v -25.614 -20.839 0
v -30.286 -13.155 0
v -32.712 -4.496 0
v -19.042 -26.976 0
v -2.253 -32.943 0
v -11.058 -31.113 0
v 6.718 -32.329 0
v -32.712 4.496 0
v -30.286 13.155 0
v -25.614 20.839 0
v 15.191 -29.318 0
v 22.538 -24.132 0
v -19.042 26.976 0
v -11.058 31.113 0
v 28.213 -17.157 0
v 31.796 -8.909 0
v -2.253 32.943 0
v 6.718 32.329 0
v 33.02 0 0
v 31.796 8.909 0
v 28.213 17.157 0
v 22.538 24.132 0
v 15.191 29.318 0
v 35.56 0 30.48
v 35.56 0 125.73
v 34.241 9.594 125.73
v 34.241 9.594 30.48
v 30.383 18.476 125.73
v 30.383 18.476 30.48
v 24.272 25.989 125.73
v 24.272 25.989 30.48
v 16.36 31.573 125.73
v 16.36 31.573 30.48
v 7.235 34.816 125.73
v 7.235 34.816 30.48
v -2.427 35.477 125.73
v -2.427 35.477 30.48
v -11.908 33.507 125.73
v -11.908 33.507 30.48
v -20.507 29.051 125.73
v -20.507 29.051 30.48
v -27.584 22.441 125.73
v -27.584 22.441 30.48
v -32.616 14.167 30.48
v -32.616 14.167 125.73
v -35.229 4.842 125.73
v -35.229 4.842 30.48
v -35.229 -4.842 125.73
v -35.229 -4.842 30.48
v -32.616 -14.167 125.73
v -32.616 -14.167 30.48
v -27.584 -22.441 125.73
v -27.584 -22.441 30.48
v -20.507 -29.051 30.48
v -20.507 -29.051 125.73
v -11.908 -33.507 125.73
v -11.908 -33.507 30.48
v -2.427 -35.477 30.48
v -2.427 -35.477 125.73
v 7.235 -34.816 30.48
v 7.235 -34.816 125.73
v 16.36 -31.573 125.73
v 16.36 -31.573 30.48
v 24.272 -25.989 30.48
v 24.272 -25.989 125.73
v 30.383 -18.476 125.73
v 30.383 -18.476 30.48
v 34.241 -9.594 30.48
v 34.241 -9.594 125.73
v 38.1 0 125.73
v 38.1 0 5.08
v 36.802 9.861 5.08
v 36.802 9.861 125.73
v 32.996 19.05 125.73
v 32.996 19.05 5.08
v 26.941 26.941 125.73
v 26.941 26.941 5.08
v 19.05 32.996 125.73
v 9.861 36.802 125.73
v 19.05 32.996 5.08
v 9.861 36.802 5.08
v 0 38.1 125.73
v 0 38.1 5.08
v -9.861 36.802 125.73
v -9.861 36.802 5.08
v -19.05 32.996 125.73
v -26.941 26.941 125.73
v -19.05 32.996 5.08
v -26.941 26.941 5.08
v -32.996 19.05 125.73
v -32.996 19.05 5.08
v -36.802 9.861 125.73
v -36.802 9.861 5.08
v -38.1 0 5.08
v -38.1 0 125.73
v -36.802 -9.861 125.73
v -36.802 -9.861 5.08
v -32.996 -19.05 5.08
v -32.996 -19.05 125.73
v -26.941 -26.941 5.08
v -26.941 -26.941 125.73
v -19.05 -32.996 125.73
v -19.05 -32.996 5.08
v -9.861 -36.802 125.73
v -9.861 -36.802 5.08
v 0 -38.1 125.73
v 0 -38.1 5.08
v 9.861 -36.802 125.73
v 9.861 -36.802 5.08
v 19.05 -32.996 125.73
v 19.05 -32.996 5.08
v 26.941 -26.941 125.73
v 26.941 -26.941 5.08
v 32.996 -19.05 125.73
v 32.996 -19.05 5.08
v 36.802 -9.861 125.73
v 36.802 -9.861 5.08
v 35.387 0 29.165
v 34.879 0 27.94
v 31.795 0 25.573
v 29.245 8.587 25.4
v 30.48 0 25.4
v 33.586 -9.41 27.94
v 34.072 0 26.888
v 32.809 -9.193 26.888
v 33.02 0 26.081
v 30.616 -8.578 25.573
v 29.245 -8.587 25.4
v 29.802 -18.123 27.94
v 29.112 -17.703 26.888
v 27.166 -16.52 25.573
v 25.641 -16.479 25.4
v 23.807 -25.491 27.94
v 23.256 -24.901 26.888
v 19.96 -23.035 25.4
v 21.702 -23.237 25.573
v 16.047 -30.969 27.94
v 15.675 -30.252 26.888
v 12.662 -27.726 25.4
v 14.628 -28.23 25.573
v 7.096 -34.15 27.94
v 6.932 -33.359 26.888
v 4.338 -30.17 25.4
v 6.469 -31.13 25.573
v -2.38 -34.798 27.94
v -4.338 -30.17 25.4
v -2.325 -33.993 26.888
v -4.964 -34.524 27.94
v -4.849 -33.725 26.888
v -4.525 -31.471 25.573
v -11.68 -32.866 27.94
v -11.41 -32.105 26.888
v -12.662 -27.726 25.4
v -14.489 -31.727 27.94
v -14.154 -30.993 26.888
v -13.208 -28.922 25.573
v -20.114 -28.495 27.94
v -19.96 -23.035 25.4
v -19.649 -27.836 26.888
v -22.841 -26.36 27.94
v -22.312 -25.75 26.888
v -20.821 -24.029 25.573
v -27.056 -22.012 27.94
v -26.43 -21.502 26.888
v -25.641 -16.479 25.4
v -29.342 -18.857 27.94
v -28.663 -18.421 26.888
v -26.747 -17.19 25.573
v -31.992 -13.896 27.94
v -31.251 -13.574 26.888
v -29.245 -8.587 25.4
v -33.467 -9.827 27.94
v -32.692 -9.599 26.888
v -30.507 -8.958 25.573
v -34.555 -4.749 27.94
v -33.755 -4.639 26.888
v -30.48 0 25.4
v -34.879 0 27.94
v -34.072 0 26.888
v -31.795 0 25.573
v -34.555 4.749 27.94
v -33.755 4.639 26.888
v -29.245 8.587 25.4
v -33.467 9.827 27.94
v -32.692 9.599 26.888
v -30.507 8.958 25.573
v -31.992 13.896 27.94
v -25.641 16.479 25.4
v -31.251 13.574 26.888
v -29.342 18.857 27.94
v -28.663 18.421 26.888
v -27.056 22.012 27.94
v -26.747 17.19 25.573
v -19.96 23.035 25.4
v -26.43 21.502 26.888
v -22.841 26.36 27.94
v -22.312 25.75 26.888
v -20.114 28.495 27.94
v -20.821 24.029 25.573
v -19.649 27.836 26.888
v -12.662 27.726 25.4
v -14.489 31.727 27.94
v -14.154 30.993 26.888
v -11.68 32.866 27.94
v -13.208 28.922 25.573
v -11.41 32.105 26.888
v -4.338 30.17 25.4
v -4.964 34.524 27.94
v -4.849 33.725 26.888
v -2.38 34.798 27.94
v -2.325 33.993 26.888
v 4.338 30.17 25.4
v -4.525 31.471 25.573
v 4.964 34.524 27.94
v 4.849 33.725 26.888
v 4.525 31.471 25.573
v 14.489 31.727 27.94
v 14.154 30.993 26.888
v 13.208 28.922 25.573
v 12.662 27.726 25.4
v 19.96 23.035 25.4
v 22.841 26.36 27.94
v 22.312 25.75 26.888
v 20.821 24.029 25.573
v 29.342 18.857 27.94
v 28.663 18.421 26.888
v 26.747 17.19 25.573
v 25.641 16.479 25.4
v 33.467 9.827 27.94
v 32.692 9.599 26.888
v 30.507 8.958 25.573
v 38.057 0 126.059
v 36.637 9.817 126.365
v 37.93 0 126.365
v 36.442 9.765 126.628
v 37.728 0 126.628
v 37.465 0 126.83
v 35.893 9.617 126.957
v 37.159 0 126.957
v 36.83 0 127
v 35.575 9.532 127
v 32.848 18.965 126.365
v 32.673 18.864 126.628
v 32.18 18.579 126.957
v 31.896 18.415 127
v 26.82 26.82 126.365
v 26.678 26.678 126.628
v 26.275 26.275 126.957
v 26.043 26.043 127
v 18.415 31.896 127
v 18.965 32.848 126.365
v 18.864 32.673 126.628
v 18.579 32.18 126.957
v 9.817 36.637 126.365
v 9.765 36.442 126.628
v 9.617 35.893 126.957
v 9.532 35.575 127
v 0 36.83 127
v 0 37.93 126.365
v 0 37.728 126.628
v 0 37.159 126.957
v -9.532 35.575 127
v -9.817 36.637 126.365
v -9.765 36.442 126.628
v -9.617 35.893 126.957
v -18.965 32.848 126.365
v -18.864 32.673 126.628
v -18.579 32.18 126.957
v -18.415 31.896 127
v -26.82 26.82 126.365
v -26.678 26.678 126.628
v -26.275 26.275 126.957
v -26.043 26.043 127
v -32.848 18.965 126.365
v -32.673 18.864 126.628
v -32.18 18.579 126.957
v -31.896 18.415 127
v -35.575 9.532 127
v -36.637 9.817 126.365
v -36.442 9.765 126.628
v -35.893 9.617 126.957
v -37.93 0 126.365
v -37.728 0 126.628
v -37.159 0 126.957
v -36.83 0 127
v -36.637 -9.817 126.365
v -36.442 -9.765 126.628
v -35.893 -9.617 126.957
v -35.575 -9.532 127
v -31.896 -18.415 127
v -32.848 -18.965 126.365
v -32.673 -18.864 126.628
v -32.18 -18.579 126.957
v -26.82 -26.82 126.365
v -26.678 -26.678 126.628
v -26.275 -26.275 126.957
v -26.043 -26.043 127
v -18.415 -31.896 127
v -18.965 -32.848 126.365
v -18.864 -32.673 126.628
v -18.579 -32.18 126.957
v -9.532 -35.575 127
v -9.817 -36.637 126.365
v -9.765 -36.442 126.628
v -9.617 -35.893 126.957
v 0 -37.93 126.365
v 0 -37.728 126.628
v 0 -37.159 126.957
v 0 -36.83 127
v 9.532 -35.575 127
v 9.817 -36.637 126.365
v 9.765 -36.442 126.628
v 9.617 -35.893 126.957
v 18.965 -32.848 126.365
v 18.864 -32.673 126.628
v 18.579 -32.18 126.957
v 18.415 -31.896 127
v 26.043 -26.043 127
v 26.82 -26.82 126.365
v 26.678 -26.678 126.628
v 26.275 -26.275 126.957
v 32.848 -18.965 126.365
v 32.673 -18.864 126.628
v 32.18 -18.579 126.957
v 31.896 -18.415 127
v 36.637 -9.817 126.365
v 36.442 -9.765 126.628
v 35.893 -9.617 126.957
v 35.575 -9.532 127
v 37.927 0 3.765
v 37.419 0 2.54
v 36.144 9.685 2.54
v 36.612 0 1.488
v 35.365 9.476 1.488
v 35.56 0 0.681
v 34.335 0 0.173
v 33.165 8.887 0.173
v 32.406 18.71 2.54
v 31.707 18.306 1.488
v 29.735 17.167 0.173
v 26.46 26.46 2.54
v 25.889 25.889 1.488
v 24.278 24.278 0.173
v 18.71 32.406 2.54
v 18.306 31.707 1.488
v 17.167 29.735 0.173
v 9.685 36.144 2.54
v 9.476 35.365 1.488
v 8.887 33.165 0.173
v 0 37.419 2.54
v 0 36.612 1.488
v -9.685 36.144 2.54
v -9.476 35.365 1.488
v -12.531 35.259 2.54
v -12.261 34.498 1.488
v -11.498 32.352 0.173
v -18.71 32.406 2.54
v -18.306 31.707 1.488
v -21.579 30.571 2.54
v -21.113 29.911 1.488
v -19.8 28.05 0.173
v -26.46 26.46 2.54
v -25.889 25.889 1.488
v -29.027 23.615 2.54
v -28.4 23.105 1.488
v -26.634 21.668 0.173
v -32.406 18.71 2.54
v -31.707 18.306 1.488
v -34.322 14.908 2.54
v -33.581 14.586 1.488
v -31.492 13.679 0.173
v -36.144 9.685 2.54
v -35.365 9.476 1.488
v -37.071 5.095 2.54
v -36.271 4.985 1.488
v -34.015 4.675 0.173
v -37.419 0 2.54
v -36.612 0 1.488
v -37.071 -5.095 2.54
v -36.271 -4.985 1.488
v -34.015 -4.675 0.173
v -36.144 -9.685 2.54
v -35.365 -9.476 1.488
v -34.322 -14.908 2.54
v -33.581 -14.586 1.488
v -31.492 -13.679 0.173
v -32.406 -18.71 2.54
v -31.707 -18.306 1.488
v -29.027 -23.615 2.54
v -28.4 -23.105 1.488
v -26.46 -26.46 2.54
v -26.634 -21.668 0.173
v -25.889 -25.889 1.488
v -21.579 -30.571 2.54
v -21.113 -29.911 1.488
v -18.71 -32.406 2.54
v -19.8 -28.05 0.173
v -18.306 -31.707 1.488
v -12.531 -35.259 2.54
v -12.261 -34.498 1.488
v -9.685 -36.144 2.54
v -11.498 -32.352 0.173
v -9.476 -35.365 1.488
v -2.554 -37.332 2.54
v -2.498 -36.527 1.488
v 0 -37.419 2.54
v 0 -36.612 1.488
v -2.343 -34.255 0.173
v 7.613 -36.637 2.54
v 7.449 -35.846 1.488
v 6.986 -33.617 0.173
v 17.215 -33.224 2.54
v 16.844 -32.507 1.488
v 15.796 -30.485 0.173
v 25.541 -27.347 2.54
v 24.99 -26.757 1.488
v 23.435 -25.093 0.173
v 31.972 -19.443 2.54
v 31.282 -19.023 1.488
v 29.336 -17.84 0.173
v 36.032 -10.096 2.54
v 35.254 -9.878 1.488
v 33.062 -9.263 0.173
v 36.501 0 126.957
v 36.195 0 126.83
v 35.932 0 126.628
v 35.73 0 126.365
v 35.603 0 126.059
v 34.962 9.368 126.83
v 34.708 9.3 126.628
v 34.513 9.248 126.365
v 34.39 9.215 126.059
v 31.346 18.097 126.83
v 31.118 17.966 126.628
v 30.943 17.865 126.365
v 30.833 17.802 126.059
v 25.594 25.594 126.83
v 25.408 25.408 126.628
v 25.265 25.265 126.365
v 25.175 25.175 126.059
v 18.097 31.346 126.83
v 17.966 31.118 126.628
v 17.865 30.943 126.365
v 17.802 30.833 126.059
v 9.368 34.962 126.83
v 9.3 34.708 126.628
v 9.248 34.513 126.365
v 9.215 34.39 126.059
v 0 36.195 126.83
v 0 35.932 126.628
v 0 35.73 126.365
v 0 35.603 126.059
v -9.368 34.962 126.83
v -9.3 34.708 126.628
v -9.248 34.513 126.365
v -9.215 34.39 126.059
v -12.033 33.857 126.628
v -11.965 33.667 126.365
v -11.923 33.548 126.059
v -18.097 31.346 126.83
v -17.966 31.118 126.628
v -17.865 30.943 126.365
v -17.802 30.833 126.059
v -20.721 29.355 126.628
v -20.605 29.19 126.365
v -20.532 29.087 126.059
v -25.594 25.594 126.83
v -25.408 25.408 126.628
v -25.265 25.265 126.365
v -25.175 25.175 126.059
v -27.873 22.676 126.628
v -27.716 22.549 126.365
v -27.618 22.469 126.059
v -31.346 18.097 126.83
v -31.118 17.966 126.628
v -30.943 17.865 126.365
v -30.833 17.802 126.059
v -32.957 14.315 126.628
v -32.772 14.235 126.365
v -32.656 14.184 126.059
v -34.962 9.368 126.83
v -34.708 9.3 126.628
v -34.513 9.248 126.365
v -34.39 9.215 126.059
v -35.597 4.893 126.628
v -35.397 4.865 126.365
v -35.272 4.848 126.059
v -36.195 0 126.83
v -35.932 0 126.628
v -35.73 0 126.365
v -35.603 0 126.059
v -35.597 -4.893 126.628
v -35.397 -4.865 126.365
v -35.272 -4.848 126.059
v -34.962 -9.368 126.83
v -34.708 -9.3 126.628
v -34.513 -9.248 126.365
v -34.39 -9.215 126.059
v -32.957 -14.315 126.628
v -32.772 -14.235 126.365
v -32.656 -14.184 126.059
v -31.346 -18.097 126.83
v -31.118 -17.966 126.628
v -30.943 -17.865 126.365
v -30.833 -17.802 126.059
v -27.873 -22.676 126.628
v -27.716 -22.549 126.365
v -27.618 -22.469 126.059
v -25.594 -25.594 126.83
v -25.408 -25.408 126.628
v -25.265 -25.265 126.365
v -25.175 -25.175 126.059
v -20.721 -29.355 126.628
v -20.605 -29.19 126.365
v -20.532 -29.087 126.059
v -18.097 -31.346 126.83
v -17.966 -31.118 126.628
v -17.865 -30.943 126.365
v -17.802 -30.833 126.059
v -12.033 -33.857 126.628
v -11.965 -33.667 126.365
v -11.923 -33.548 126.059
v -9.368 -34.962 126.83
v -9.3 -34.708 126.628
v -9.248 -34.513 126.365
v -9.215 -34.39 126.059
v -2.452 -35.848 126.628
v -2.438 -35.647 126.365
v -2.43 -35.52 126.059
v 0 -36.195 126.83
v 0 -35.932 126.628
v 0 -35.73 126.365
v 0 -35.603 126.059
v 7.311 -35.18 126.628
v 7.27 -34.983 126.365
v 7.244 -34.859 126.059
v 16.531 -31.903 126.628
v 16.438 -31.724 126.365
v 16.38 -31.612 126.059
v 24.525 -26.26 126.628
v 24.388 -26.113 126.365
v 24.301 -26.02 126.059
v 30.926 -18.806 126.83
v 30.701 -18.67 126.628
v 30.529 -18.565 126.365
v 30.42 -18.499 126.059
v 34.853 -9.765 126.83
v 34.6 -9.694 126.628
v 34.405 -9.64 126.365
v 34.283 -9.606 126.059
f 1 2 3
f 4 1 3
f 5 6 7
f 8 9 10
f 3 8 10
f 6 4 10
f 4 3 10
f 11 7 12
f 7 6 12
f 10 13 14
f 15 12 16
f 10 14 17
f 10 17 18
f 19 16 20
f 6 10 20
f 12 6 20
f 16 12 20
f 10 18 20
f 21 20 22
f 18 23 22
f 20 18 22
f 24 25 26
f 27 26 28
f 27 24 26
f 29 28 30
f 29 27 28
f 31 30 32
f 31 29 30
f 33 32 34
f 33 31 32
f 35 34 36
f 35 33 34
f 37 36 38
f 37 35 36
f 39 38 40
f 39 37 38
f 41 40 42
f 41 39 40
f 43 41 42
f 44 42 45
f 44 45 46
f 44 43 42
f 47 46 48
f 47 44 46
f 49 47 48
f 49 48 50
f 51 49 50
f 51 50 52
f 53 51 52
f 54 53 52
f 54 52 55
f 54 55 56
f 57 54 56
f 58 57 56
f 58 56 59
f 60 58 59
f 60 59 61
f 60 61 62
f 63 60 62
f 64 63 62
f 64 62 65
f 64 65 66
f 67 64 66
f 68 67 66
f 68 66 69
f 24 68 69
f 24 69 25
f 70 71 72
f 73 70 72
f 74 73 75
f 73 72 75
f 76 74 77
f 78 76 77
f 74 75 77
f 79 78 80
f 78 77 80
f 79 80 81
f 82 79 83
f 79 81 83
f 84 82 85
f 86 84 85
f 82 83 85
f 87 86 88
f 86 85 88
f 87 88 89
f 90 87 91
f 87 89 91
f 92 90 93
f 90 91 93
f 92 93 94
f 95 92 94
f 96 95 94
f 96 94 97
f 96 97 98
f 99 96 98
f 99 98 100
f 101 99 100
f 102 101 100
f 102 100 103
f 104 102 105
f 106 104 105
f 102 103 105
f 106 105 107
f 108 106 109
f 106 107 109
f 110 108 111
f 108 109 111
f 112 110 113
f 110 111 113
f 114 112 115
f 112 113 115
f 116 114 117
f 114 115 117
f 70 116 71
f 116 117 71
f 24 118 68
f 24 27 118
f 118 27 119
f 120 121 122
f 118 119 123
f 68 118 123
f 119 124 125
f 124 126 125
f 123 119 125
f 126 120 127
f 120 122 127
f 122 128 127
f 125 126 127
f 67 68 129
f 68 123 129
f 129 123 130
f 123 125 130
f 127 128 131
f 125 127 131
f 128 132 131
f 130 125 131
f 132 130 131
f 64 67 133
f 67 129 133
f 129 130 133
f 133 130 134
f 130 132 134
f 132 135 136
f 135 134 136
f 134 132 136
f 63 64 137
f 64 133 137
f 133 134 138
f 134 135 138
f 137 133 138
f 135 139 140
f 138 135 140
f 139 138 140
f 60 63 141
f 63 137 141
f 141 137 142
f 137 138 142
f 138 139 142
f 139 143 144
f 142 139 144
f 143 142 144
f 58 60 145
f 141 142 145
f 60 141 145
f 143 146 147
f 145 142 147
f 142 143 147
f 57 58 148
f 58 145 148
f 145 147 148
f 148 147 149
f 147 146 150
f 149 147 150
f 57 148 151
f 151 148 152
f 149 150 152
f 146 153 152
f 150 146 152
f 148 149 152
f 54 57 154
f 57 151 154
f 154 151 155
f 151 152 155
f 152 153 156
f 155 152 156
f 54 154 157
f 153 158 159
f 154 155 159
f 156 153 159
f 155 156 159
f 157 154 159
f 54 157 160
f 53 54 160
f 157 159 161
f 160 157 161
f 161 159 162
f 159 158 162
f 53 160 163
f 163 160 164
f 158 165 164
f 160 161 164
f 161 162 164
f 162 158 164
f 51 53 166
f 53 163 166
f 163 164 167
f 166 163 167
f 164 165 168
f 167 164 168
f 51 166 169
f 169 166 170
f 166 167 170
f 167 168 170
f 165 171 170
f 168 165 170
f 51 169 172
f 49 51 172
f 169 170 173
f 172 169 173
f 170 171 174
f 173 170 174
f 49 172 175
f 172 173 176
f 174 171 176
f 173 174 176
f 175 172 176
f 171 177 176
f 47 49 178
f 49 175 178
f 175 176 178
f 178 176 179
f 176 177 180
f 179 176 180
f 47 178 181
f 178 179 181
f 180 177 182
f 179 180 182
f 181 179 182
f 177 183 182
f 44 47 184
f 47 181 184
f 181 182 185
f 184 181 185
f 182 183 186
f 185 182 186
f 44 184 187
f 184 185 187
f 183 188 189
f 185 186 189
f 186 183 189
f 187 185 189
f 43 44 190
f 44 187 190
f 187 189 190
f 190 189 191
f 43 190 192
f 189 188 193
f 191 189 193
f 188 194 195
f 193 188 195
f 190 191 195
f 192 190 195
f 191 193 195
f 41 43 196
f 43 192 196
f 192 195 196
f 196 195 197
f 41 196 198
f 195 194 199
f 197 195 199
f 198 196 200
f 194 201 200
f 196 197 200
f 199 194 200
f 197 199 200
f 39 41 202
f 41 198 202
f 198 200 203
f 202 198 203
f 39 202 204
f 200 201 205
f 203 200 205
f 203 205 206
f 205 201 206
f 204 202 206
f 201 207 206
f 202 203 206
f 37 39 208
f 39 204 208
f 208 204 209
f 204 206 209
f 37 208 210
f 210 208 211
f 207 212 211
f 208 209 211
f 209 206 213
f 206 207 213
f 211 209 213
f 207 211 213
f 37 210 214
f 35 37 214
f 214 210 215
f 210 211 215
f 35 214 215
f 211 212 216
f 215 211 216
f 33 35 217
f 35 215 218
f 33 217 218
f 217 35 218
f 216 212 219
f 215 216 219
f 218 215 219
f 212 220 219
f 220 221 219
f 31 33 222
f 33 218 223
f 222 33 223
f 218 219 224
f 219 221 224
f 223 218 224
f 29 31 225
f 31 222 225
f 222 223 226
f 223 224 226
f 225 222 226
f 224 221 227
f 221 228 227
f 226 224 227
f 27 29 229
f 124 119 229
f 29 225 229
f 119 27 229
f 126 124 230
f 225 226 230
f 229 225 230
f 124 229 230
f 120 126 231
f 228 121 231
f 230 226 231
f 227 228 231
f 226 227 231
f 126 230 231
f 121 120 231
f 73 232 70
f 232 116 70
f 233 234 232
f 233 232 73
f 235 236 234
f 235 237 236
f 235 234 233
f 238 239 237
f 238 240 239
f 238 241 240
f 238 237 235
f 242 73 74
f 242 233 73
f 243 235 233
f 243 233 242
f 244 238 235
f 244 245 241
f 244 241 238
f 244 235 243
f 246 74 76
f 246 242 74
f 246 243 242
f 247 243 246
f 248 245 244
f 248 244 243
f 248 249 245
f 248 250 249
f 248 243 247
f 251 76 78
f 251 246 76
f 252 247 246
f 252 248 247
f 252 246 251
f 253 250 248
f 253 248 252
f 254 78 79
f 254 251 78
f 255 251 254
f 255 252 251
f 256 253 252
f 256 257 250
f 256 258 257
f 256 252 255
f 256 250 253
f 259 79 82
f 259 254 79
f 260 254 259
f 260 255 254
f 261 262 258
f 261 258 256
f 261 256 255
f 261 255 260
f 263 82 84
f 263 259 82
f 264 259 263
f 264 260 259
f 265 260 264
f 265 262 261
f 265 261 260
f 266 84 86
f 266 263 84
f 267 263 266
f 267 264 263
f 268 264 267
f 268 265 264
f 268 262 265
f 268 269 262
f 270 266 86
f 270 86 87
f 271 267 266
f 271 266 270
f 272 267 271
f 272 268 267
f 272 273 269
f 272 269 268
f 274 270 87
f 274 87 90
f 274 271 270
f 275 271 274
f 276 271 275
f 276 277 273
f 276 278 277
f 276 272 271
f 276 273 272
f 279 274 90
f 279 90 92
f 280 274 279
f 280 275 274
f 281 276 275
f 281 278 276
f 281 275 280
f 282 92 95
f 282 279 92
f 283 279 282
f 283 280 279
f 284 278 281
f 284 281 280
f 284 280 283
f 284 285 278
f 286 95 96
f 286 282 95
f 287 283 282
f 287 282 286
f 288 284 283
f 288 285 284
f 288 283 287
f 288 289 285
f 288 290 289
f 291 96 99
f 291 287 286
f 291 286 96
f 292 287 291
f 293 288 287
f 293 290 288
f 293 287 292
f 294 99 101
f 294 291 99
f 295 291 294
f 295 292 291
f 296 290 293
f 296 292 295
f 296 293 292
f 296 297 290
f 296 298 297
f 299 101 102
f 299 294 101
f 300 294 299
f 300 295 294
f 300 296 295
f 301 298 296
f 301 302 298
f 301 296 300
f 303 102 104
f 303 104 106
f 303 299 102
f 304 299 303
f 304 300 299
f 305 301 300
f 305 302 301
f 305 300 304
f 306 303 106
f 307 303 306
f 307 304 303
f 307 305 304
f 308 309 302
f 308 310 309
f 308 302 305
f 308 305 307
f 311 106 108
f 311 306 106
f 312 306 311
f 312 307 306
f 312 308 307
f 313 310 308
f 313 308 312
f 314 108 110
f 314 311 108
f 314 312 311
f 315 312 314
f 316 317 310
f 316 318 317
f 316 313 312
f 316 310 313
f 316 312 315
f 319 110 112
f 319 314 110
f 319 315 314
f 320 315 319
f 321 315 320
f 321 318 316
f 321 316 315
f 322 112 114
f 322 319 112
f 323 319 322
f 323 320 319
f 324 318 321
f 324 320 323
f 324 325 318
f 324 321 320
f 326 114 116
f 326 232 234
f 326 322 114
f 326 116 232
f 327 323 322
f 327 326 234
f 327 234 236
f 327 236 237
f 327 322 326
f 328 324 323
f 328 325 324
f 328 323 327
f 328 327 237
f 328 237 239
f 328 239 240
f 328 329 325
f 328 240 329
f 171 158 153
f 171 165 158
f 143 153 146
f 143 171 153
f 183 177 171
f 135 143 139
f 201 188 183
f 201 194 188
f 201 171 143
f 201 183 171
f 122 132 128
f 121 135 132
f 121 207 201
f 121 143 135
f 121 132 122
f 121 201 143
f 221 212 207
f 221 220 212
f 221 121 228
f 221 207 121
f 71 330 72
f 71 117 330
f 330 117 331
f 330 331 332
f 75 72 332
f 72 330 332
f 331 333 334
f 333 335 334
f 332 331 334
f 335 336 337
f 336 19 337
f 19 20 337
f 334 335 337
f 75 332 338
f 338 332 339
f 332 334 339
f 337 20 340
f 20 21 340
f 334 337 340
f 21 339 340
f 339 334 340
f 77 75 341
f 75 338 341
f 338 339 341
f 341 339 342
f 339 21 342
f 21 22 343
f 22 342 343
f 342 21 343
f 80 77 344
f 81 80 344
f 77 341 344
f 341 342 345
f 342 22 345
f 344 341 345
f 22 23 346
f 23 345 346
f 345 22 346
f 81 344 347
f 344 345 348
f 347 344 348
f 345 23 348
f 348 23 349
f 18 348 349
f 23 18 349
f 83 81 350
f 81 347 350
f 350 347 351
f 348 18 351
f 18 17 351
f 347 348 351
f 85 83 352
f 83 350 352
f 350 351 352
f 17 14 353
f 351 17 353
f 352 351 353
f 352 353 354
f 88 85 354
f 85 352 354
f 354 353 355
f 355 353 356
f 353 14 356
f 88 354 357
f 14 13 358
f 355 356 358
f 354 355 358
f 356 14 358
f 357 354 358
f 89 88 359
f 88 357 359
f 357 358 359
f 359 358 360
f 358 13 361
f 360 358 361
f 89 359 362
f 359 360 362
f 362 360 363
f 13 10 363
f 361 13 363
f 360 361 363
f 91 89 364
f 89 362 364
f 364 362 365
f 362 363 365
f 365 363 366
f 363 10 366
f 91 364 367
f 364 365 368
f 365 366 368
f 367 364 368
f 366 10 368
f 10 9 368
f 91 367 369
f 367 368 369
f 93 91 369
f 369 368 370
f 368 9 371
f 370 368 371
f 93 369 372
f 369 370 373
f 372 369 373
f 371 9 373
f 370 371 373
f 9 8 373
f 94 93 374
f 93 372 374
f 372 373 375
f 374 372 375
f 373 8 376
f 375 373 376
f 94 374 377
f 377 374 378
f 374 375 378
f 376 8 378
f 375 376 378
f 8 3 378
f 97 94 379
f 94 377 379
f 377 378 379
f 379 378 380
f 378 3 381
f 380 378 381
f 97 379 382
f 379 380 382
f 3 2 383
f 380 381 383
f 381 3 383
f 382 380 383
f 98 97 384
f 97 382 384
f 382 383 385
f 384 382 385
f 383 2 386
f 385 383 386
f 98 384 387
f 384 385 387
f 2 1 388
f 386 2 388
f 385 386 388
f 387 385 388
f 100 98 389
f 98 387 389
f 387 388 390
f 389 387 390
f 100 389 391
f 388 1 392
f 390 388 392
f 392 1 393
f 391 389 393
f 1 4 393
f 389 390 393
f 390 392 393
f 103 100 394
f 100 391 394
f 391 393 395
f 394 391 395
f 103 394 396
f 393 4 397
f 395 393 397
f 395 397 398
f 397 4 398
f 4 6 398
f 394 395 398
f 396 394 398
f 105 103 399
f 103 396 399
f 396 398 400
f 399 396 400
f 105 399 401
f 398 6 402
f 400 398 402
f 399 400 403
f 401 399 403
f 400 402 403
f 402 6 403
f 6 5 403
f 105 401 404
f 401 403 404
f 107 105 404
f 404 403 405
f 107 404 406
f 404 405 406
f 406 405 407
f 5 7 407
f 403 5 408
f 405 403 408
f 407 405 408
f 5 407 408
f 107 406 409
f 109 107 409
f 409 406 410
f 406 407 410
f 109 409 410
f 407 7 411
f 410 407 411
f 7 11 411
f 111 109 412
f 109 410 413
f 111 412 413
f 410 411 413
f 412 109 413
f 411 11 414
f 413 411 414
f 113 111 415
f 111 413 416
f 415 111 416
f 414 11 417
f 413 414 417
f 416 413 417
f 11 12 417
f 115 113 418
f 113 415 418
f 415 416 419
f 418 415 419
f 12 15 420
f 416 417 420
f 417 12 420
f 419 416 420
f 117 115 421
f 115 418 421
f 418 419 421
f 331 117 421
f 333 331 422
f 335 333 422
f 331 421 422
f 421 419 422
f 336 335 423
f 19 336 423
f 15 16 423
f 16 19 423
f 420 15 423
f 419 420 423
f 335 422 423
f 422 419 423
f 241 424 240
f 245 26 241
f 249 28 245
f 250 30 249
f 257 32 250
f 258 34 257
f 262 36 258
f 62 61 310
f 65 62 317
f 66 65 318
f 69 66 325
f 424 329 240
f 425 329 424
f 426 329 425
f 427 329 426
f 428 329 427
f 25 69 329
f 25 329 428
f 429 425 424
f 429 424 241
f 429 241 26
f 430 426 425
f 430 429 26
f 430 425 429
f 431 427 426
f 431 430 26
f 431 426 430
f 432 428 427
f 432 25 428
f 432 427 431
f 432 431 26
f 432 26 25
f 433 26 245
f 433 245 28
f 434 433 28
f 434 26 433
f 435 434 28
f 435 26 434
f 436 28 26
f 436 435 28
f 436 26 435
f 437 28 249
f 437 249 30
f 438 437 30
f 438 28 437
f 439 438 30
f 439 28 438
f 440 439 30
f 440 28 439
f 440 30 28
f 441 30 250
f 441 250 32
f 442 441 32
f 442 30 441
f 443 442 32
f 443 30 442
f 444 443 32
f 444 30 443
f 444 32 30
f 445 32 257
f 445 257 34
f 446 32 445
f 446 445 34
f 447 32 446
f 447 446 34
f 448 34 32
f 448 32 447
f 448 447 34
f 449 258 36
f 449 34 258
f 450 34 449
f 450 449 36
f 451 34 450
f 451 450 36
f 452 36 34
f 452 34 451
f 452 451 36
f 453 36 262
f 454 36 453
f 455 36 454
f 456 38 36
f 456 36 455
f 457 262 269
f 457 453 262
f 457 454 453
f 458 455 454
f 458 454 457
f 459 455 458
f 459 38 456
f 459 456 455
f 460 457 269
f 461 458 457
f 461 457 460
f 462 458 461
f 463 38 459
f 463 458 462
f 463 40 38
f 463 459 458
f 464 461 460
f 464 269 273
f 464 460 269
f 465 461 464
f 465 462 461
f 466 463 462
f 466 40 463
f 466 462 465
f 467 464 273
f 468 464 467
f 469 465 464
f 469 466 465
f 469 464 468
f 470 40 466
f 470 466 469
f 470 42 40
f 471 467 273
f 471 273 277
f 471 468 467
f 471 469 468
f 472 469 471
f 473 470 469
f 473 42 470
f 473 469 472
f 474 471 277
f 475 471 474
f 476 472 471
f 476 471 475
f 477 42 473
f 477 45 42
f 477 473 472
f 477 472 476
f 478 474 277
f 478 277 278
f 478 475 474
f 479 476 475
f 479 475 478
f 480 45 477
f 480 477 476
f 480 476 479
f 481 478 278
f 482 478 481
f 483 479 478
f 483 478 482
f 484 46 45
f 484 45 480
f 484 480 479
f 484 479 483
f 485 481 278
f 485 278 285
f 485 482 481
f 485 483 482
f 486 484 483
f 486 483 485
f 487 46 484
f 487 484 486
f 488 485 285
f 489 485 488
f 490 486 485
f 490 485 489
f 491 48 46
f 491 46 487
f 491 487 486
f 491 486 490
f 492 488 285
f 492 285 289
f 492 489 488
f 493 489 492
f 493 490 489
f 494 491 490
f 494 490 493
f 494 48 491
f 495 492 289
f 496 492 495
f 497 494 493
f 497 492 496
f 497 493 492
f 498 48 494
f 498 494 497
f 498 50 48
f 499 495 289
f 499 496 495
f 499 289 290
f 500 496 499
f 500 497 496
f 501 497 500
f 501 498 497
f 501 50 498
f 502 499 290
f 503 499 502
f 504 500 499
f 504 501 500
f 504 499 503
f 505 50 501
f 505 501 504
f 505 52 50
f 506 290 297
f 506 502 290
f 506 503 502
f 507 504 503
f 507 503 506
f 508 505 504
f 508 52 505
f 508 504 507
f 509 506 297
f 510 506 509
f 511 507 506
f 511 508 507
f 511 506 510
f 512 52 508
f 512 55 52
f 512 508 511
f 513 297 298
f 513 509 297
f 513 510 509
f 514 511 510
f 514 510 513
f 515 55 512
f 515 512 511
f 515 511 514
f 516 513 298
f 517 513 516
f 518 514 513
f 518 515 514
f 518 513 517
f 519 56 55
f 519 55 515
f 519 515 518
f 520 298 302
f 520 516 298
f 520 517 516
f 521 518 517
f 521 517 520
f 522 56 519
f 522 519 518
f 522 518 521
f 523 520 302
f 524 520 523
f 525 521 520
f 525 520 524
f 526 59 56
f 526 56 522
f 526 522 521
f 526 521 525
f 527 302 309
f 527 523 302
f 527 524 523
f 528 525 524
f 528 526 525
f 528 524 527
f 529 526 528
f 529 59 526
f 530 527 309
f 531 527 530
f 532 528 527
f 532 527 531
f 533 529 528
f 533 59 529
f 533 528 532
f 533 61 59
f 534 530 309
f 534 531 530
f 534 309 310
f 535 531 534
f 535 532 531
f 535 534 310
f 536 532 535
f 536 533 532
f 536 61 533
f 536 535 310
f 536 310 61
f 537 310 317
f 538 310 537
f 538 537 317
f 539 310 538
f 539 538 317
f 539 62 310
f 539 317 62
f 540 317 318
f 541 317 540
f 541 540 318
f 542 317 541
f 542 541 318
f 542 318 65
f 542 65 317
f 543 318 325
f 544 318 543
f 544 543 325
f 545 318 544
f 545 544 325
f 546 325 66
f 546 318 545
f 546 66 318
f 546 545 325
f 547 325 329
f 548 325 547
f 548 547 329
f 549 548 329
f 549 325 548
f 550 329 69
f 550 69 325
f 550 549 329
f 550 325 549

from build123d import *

# Parameters (mm, degrees)
F0_R     = 38.1
F0_R_2   = 35.56
F1_DEPTH = 127
F2_R     = 38.1
F3_DEPTH = 25.4
F4_R     = 1.26999
F5_R     = 5.08
F6_R     = 5.08


# Not quite as in the source:
# - a fillet or chamfer is up to 0.001 mm smaller than in the source, because OpenCascade refuses the exact size


with BuildPart() as f1:
    # F0 (on Top) → F1 (new body)
    with BuildSketch(Plane.XY):
        Circle(F0_R)
        Circle(F0_R_2, mode=Mode.SUBTRACT)
    extrude(amount=F1_DEPTH)

    # F2 (on Top) → F3 (join)
    with BuildSketch(Plane.XY):
        Circle(F2_R)
    extrude(amount=F3_DEPTH)

    # F4 (radius 1.27 in the source; OpenCascade refuses exactly that, so slightly less here)
    f4_edges = [f1.edges().sort_by_distance(p)[0] for p in [
        (-38.1, 0, 127),
        (-35.56, 0, 127),
    ]]
    fillet(f4_edges, radius=F4_R)

    # F5
    f5_edges = [f1.edges().sort_by_distance(p)[0] for p in [
        (-38.1, 0, 0),
    ]]
    fillet(f5_edges, radius=F5_R)

    # F6
    f6_edges = [f1.edges().sort_by_distance(p)[0] for p in [
        (-35.56, 0, 25.4),
    ]]
    fillet(f6_edges, radius=F6_R)


solid = f1.part
